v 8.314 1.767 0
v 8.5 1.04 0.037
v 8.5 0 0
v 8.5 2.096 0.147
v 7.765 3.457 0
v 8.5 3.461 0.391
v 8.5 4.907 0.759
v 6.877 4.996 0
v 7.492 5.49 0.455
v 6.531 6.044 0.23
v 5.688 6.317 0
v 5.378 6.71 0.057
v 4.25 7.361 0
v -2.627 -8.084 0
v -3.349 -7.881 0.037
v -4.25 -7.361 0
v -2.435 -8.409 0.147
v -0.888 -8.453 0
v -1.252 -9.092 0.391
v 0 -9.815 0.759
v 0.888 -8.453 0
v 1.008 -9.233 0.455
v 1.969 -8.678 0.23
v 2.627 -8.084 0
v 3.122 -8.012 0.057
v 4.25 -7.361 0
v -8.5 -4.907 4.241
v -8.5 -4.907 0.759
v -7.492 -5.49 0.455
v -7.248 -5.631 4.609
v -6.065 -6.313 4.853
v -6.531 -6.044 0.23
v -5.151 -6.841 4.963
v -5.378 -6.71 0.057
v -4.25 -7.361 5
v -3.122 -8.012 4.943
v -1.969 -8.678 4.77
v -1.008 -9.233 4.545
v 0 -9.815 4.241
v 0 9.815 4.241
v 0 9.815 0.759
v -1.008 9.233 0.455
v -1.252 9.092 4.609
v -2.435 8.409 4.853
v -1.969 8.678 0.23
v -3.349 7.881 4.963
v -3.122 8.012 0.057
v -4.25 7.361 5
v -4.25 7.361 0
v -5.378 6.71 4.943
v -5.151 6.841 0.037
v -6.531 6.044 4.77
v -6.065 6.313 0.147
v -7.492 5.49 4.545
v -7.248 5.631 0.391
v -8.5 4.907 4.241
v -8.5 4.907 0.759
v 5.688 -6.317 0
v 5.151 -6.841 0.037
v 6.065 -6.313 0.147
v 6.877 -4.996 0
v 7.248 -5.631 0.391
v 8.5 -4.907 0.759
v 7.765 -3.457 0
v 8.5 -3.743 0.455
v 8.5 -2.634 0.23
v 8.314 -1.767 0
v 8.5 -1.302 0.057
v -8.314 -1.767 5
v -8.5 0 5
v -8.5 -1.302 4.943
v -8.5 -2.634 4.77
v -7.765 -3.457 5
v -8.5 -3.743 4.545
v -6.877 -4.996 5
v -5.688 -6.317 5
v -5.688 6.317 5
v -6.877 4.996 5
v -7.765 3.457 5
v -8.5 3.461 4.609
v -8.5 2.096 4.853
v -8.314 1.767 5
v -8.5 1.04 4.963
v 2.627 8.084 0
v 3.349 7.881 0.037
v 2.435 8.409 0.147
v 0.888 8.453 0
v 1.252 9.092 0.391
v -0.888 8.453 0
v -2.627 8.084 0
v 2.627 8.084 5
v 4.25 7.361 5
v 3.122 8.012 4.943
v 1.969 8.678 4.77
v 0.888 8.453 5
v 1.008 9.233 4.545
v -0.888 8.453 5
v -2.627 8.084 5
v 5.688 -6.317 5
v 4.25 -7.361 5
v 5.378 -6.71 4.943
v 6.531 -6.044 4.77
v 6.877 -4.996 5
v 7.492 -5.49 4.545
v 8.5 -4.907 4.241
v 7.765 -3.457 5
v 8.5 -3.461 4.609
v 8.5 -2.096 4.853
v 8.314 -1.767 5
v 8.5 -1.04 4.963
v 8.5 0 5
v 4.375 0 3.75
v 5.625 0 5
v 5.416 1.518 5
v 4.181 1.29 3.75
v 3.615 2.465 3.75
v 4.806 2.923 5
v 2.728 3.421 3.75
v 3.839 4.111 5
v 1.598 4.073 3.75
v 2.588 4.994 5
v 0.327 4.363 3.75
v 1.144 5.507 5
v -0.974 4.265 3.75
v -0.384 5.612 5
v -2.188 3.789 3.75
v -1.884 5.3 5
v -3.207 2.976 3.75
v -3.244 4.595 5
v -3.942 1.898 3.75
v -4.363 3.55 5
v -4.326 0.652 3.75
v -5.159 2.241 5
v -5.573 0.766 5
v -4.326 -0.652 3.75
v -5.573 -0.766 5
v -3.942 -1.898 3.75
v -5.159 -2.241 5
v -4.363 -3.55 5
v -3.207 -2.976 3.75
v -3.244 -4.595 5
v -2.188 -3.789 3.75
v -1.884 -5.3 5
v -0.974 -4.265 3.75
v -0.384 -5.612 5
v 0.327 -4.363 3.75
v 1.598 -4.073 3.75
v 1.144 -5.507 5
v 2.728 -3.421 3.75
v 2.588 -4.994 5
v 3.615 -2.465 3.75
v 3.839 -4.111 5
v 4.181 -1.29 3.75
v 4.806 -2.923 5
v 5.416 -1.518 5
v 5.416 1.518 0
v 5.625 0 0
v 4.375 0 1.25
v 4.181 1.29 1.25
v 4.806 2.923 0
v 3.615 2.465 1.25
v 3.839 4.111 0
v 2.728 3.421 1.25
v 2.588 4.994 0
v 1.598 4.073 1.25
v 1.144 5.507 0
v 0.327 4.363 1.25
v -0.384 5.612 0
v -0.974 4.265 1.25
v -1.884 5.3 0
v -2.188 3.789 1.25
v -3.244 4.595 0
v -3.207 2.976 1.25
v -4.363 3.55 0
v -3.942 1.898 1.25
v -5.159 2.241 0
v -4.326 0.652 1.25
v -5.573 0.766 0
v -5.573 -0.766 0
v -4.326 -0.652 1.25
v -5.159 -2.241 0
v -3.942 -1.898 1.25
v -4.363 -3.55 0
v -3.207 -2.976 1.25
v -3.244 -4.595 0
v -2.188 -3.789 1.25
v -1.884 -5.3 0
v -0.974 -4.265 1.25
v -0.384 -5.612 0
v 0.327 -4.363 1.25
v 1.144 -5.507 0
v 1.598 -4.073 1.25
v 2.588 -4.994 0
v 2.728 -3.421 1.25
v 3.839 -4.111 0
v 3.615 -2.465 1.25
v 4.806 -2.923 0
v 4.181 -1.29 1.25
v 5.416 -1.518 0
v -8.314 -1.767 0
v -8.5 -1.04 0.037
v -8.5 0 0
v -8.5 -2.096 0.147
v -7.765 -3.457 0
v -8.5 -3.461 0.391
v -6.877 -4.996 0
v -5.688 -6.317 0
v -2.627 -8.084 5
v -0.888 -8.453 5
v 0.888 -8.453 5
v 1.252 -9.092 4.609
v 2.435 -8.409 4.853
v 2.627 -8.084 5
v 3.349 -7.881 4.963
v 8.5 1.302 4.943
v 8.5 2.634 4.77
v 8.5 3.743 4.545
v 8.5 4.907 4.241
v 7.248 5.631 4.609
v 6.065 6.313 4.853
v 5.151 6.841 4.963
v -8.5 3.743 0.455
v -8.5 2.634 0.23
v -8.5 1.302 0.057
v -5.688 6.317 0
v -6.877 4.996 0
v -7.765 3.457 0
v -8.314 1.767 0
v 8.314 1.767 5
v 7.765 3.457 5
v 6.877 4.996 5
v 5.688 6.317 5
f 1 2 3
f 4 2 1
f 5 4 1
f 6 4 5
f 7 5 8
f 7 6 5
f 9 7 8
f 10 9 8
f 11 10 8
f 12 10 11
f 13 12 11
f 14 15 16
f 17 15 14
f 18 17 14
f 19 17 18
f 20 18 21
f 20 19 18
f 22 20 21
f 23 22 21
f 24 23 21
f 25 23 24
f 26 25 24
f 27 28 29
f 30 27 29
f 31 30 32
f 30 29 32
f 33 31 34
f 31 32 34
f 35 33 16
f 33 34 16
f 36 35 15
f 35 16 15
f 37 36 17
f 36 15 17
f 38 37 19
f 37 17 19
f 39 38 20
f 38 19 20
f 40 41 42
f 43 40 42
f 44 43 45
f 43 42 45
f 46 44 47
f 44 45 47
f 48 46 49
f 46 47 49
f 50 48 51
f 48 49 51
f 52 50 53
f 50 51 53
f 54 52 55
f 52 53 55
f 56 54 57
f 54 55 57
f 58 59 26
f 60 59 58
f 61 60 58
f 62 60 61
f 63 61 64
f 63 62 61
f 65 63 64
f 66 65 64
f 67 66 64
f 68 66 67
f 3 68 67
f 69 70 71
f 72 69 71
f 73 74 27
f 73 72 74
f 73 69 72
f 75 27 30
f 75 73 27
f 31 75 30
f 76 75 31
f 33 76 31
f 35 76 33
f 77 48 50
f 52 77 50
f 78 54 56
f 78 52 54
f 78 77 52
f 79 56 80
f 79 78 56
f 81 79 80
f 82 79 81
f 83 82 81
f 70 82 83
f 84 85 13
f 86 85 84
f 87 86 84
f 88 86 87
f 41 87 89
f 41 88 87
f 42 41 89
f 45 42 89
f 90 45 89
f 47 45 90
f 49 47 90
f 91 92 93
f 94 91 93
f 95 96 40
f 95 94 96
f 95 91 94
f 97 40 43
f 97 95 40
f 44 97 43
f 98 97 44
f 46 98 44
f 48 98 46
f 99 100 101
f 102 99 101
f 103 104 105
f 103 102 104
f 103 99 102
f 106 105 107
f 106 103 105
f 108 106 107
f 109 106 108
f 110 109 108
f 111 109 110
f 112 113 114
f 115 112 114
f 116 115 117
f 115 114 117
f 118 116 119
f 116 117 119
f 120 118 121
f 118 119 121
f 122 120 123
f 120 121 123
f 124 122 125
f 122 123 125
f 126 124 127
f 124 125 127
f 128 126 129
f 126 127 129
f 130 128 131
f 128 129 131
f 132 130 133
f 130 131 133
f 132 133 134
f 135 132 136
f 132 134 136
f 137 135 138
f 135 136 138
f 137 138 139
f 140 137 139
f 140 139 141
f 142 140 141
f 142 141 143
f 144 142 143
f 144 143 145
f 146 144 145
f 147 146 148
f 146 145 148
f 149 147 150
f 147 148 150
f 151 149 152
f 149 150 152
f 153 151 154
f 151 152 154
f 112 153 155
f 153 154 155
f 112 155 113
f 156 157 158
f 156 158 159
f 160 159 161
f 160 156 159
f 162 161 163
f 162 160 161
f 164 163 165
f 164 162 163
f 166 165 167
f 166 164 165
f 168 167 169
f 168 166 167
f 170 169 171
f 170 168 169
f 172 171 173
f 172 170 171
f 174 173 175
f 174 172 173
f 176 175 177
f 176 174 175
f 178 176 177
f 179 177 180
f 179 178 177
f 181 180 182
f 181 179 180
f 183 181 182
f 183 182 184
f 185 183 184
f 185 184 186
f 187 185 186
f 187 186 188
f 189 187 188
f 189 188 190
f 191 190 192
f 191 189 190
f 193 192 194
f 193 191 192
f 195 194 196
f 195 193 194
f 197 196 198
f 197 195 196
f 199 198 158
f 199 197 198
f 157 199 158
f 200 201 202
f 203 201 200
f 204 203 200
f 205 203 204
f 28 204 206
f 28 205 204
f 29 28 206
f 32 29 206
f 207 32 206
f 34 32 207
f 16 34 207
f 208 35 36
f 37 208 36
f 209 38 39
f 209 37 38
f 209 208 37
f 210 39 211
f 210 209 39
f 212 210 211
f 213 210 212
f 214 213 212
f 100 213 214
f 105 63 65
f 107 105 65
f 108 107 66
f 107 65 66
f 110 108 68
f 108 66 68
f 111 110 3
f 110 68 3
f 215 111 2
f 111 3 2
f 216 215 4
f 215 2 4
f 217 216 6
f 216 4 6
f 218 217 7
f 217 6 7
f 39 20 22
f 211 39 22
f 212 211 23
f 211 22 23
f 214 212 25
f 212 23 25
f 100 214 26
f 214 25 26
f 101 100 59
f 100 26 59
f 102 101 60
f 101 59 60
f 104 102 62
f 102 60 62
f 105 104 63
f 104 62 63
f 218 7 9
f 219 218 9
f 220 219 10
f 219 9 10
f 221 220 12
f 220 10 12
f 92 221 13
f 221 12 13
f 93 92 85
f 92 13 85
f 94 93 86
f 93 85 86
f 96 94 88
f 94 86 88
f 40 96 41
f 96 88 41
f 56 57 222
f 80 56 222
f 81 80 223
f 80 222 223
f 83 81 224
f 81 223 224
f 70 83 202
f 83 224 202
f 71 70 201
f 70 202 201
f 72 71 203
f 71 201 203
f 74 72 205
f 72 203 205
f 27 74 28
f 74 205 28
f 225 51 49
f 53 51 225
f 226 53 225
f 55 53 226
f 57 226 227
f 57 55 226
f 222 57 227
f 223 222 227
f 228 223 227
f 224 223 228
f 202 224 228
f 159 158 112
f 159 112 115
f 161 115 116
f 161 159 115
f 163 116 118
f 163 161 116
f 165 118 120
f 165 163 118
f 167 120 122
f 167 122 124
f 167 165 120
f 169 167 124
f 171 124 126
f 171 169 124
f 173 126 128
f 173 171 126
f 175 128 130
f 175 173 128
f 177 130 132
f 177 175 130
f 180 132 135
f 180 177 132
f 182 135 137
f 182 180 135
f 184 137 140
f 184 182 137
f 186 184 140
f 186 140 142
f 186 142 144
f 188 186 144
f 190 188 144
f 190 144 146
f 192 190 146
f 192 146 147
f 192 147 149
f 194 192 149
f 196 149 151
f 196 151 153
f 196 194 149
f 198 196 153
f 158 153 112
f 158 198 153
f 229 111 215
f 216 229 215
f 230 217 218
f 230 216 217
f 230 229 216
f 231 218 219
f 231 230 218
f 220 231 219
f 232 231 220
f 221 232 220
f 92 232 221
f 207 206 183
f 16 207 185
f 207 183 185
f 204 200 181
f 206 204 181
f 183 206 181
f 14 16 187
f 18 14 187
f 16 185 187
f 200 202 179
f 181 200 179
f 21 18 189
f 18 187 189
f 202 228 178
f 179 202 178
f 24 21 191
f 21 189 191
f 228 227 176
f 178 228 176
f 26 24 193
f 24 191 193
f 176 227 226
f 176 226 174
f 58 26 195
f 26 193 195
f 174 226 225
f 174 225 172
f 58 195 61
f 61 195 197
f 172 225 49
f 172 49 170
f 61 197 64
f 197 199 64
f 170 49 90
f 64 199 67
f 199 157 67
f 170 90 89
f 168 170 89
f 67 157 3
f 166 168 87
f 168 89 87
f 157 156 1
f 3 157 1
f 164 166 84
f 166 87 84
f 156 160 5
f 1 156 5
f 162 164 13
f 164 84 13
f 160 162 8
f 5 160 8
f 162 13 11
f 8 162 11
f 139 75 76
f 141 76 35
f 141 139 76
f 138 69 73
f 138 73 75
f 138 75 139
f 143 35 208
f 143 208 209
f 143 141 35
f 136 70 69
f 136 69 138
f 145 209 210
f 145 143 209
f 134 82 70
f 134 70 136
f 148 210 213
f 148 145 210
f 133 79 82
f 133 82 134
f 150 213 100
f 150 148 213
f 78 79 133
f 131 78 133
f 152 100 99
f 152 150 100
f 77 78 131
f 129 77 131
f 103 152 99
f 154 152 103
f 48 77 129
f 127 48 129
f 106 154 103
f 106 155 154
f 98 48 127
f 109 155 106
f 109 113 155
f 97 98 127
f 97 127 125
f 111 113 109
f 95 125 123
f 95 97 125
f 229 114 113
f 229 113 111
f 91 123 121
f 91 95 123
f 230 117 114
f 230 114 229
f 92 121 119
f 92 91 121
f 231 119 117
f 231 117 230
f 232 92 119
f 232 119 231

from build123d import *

# Parameters (mm, degrees)
SKETCH_1_R      = 4.375
EXTRUDE_1_DEPTH = 5
CHAMFER_1_SIZE  = 1.25


with BuildPart() as part:
    # Эскиз1 → Бобышка-Вытянуть1 (new body)
    with BuildSketch(Plane.XY):
        Polygon((8.5, -4.907477288), (8.5, 4.907477288), (0, 9.814954576), (-8.5, 4.907477288), (-8.5, -4.907477288), (0, -9.814954576), align=None)
        Circle(SKETCH_1_R, mode=Mode.SUBTRACT)
    extrude(amount=EXTRUDE_1_DEPTH)

    # Фаска1
    chamfer_1_edges = [part.edges().sort_by_distance(p)[0] for p in [
        (-4.375, 0, 0),
        (-4.375, 0, 5),
    ]]
    chamfer(chamfer_1_edges, length=CHAMFER_1_SIZE)

    # Эскиз3 → Вырез-Повернуть1 (revolve, cut)
    with BuildSketch(Plane(origin=(0, 0, 0), x_dir=(0, 0, -1), z_dir=(1, 0, 0))):
        Polygon((-0.759189379, 9.814954576), (0, 9.814954576), (0, 8.5), align=None)
        Polygon((-4.240810621, 9.814954576), (-5, 8.5), (-5, 9.814954576), align=None)
    revolve(axis=Axis((0, 0, 0), (0, 0, 1)), mode=Mode.SUBTRACT)


solid = part.part
